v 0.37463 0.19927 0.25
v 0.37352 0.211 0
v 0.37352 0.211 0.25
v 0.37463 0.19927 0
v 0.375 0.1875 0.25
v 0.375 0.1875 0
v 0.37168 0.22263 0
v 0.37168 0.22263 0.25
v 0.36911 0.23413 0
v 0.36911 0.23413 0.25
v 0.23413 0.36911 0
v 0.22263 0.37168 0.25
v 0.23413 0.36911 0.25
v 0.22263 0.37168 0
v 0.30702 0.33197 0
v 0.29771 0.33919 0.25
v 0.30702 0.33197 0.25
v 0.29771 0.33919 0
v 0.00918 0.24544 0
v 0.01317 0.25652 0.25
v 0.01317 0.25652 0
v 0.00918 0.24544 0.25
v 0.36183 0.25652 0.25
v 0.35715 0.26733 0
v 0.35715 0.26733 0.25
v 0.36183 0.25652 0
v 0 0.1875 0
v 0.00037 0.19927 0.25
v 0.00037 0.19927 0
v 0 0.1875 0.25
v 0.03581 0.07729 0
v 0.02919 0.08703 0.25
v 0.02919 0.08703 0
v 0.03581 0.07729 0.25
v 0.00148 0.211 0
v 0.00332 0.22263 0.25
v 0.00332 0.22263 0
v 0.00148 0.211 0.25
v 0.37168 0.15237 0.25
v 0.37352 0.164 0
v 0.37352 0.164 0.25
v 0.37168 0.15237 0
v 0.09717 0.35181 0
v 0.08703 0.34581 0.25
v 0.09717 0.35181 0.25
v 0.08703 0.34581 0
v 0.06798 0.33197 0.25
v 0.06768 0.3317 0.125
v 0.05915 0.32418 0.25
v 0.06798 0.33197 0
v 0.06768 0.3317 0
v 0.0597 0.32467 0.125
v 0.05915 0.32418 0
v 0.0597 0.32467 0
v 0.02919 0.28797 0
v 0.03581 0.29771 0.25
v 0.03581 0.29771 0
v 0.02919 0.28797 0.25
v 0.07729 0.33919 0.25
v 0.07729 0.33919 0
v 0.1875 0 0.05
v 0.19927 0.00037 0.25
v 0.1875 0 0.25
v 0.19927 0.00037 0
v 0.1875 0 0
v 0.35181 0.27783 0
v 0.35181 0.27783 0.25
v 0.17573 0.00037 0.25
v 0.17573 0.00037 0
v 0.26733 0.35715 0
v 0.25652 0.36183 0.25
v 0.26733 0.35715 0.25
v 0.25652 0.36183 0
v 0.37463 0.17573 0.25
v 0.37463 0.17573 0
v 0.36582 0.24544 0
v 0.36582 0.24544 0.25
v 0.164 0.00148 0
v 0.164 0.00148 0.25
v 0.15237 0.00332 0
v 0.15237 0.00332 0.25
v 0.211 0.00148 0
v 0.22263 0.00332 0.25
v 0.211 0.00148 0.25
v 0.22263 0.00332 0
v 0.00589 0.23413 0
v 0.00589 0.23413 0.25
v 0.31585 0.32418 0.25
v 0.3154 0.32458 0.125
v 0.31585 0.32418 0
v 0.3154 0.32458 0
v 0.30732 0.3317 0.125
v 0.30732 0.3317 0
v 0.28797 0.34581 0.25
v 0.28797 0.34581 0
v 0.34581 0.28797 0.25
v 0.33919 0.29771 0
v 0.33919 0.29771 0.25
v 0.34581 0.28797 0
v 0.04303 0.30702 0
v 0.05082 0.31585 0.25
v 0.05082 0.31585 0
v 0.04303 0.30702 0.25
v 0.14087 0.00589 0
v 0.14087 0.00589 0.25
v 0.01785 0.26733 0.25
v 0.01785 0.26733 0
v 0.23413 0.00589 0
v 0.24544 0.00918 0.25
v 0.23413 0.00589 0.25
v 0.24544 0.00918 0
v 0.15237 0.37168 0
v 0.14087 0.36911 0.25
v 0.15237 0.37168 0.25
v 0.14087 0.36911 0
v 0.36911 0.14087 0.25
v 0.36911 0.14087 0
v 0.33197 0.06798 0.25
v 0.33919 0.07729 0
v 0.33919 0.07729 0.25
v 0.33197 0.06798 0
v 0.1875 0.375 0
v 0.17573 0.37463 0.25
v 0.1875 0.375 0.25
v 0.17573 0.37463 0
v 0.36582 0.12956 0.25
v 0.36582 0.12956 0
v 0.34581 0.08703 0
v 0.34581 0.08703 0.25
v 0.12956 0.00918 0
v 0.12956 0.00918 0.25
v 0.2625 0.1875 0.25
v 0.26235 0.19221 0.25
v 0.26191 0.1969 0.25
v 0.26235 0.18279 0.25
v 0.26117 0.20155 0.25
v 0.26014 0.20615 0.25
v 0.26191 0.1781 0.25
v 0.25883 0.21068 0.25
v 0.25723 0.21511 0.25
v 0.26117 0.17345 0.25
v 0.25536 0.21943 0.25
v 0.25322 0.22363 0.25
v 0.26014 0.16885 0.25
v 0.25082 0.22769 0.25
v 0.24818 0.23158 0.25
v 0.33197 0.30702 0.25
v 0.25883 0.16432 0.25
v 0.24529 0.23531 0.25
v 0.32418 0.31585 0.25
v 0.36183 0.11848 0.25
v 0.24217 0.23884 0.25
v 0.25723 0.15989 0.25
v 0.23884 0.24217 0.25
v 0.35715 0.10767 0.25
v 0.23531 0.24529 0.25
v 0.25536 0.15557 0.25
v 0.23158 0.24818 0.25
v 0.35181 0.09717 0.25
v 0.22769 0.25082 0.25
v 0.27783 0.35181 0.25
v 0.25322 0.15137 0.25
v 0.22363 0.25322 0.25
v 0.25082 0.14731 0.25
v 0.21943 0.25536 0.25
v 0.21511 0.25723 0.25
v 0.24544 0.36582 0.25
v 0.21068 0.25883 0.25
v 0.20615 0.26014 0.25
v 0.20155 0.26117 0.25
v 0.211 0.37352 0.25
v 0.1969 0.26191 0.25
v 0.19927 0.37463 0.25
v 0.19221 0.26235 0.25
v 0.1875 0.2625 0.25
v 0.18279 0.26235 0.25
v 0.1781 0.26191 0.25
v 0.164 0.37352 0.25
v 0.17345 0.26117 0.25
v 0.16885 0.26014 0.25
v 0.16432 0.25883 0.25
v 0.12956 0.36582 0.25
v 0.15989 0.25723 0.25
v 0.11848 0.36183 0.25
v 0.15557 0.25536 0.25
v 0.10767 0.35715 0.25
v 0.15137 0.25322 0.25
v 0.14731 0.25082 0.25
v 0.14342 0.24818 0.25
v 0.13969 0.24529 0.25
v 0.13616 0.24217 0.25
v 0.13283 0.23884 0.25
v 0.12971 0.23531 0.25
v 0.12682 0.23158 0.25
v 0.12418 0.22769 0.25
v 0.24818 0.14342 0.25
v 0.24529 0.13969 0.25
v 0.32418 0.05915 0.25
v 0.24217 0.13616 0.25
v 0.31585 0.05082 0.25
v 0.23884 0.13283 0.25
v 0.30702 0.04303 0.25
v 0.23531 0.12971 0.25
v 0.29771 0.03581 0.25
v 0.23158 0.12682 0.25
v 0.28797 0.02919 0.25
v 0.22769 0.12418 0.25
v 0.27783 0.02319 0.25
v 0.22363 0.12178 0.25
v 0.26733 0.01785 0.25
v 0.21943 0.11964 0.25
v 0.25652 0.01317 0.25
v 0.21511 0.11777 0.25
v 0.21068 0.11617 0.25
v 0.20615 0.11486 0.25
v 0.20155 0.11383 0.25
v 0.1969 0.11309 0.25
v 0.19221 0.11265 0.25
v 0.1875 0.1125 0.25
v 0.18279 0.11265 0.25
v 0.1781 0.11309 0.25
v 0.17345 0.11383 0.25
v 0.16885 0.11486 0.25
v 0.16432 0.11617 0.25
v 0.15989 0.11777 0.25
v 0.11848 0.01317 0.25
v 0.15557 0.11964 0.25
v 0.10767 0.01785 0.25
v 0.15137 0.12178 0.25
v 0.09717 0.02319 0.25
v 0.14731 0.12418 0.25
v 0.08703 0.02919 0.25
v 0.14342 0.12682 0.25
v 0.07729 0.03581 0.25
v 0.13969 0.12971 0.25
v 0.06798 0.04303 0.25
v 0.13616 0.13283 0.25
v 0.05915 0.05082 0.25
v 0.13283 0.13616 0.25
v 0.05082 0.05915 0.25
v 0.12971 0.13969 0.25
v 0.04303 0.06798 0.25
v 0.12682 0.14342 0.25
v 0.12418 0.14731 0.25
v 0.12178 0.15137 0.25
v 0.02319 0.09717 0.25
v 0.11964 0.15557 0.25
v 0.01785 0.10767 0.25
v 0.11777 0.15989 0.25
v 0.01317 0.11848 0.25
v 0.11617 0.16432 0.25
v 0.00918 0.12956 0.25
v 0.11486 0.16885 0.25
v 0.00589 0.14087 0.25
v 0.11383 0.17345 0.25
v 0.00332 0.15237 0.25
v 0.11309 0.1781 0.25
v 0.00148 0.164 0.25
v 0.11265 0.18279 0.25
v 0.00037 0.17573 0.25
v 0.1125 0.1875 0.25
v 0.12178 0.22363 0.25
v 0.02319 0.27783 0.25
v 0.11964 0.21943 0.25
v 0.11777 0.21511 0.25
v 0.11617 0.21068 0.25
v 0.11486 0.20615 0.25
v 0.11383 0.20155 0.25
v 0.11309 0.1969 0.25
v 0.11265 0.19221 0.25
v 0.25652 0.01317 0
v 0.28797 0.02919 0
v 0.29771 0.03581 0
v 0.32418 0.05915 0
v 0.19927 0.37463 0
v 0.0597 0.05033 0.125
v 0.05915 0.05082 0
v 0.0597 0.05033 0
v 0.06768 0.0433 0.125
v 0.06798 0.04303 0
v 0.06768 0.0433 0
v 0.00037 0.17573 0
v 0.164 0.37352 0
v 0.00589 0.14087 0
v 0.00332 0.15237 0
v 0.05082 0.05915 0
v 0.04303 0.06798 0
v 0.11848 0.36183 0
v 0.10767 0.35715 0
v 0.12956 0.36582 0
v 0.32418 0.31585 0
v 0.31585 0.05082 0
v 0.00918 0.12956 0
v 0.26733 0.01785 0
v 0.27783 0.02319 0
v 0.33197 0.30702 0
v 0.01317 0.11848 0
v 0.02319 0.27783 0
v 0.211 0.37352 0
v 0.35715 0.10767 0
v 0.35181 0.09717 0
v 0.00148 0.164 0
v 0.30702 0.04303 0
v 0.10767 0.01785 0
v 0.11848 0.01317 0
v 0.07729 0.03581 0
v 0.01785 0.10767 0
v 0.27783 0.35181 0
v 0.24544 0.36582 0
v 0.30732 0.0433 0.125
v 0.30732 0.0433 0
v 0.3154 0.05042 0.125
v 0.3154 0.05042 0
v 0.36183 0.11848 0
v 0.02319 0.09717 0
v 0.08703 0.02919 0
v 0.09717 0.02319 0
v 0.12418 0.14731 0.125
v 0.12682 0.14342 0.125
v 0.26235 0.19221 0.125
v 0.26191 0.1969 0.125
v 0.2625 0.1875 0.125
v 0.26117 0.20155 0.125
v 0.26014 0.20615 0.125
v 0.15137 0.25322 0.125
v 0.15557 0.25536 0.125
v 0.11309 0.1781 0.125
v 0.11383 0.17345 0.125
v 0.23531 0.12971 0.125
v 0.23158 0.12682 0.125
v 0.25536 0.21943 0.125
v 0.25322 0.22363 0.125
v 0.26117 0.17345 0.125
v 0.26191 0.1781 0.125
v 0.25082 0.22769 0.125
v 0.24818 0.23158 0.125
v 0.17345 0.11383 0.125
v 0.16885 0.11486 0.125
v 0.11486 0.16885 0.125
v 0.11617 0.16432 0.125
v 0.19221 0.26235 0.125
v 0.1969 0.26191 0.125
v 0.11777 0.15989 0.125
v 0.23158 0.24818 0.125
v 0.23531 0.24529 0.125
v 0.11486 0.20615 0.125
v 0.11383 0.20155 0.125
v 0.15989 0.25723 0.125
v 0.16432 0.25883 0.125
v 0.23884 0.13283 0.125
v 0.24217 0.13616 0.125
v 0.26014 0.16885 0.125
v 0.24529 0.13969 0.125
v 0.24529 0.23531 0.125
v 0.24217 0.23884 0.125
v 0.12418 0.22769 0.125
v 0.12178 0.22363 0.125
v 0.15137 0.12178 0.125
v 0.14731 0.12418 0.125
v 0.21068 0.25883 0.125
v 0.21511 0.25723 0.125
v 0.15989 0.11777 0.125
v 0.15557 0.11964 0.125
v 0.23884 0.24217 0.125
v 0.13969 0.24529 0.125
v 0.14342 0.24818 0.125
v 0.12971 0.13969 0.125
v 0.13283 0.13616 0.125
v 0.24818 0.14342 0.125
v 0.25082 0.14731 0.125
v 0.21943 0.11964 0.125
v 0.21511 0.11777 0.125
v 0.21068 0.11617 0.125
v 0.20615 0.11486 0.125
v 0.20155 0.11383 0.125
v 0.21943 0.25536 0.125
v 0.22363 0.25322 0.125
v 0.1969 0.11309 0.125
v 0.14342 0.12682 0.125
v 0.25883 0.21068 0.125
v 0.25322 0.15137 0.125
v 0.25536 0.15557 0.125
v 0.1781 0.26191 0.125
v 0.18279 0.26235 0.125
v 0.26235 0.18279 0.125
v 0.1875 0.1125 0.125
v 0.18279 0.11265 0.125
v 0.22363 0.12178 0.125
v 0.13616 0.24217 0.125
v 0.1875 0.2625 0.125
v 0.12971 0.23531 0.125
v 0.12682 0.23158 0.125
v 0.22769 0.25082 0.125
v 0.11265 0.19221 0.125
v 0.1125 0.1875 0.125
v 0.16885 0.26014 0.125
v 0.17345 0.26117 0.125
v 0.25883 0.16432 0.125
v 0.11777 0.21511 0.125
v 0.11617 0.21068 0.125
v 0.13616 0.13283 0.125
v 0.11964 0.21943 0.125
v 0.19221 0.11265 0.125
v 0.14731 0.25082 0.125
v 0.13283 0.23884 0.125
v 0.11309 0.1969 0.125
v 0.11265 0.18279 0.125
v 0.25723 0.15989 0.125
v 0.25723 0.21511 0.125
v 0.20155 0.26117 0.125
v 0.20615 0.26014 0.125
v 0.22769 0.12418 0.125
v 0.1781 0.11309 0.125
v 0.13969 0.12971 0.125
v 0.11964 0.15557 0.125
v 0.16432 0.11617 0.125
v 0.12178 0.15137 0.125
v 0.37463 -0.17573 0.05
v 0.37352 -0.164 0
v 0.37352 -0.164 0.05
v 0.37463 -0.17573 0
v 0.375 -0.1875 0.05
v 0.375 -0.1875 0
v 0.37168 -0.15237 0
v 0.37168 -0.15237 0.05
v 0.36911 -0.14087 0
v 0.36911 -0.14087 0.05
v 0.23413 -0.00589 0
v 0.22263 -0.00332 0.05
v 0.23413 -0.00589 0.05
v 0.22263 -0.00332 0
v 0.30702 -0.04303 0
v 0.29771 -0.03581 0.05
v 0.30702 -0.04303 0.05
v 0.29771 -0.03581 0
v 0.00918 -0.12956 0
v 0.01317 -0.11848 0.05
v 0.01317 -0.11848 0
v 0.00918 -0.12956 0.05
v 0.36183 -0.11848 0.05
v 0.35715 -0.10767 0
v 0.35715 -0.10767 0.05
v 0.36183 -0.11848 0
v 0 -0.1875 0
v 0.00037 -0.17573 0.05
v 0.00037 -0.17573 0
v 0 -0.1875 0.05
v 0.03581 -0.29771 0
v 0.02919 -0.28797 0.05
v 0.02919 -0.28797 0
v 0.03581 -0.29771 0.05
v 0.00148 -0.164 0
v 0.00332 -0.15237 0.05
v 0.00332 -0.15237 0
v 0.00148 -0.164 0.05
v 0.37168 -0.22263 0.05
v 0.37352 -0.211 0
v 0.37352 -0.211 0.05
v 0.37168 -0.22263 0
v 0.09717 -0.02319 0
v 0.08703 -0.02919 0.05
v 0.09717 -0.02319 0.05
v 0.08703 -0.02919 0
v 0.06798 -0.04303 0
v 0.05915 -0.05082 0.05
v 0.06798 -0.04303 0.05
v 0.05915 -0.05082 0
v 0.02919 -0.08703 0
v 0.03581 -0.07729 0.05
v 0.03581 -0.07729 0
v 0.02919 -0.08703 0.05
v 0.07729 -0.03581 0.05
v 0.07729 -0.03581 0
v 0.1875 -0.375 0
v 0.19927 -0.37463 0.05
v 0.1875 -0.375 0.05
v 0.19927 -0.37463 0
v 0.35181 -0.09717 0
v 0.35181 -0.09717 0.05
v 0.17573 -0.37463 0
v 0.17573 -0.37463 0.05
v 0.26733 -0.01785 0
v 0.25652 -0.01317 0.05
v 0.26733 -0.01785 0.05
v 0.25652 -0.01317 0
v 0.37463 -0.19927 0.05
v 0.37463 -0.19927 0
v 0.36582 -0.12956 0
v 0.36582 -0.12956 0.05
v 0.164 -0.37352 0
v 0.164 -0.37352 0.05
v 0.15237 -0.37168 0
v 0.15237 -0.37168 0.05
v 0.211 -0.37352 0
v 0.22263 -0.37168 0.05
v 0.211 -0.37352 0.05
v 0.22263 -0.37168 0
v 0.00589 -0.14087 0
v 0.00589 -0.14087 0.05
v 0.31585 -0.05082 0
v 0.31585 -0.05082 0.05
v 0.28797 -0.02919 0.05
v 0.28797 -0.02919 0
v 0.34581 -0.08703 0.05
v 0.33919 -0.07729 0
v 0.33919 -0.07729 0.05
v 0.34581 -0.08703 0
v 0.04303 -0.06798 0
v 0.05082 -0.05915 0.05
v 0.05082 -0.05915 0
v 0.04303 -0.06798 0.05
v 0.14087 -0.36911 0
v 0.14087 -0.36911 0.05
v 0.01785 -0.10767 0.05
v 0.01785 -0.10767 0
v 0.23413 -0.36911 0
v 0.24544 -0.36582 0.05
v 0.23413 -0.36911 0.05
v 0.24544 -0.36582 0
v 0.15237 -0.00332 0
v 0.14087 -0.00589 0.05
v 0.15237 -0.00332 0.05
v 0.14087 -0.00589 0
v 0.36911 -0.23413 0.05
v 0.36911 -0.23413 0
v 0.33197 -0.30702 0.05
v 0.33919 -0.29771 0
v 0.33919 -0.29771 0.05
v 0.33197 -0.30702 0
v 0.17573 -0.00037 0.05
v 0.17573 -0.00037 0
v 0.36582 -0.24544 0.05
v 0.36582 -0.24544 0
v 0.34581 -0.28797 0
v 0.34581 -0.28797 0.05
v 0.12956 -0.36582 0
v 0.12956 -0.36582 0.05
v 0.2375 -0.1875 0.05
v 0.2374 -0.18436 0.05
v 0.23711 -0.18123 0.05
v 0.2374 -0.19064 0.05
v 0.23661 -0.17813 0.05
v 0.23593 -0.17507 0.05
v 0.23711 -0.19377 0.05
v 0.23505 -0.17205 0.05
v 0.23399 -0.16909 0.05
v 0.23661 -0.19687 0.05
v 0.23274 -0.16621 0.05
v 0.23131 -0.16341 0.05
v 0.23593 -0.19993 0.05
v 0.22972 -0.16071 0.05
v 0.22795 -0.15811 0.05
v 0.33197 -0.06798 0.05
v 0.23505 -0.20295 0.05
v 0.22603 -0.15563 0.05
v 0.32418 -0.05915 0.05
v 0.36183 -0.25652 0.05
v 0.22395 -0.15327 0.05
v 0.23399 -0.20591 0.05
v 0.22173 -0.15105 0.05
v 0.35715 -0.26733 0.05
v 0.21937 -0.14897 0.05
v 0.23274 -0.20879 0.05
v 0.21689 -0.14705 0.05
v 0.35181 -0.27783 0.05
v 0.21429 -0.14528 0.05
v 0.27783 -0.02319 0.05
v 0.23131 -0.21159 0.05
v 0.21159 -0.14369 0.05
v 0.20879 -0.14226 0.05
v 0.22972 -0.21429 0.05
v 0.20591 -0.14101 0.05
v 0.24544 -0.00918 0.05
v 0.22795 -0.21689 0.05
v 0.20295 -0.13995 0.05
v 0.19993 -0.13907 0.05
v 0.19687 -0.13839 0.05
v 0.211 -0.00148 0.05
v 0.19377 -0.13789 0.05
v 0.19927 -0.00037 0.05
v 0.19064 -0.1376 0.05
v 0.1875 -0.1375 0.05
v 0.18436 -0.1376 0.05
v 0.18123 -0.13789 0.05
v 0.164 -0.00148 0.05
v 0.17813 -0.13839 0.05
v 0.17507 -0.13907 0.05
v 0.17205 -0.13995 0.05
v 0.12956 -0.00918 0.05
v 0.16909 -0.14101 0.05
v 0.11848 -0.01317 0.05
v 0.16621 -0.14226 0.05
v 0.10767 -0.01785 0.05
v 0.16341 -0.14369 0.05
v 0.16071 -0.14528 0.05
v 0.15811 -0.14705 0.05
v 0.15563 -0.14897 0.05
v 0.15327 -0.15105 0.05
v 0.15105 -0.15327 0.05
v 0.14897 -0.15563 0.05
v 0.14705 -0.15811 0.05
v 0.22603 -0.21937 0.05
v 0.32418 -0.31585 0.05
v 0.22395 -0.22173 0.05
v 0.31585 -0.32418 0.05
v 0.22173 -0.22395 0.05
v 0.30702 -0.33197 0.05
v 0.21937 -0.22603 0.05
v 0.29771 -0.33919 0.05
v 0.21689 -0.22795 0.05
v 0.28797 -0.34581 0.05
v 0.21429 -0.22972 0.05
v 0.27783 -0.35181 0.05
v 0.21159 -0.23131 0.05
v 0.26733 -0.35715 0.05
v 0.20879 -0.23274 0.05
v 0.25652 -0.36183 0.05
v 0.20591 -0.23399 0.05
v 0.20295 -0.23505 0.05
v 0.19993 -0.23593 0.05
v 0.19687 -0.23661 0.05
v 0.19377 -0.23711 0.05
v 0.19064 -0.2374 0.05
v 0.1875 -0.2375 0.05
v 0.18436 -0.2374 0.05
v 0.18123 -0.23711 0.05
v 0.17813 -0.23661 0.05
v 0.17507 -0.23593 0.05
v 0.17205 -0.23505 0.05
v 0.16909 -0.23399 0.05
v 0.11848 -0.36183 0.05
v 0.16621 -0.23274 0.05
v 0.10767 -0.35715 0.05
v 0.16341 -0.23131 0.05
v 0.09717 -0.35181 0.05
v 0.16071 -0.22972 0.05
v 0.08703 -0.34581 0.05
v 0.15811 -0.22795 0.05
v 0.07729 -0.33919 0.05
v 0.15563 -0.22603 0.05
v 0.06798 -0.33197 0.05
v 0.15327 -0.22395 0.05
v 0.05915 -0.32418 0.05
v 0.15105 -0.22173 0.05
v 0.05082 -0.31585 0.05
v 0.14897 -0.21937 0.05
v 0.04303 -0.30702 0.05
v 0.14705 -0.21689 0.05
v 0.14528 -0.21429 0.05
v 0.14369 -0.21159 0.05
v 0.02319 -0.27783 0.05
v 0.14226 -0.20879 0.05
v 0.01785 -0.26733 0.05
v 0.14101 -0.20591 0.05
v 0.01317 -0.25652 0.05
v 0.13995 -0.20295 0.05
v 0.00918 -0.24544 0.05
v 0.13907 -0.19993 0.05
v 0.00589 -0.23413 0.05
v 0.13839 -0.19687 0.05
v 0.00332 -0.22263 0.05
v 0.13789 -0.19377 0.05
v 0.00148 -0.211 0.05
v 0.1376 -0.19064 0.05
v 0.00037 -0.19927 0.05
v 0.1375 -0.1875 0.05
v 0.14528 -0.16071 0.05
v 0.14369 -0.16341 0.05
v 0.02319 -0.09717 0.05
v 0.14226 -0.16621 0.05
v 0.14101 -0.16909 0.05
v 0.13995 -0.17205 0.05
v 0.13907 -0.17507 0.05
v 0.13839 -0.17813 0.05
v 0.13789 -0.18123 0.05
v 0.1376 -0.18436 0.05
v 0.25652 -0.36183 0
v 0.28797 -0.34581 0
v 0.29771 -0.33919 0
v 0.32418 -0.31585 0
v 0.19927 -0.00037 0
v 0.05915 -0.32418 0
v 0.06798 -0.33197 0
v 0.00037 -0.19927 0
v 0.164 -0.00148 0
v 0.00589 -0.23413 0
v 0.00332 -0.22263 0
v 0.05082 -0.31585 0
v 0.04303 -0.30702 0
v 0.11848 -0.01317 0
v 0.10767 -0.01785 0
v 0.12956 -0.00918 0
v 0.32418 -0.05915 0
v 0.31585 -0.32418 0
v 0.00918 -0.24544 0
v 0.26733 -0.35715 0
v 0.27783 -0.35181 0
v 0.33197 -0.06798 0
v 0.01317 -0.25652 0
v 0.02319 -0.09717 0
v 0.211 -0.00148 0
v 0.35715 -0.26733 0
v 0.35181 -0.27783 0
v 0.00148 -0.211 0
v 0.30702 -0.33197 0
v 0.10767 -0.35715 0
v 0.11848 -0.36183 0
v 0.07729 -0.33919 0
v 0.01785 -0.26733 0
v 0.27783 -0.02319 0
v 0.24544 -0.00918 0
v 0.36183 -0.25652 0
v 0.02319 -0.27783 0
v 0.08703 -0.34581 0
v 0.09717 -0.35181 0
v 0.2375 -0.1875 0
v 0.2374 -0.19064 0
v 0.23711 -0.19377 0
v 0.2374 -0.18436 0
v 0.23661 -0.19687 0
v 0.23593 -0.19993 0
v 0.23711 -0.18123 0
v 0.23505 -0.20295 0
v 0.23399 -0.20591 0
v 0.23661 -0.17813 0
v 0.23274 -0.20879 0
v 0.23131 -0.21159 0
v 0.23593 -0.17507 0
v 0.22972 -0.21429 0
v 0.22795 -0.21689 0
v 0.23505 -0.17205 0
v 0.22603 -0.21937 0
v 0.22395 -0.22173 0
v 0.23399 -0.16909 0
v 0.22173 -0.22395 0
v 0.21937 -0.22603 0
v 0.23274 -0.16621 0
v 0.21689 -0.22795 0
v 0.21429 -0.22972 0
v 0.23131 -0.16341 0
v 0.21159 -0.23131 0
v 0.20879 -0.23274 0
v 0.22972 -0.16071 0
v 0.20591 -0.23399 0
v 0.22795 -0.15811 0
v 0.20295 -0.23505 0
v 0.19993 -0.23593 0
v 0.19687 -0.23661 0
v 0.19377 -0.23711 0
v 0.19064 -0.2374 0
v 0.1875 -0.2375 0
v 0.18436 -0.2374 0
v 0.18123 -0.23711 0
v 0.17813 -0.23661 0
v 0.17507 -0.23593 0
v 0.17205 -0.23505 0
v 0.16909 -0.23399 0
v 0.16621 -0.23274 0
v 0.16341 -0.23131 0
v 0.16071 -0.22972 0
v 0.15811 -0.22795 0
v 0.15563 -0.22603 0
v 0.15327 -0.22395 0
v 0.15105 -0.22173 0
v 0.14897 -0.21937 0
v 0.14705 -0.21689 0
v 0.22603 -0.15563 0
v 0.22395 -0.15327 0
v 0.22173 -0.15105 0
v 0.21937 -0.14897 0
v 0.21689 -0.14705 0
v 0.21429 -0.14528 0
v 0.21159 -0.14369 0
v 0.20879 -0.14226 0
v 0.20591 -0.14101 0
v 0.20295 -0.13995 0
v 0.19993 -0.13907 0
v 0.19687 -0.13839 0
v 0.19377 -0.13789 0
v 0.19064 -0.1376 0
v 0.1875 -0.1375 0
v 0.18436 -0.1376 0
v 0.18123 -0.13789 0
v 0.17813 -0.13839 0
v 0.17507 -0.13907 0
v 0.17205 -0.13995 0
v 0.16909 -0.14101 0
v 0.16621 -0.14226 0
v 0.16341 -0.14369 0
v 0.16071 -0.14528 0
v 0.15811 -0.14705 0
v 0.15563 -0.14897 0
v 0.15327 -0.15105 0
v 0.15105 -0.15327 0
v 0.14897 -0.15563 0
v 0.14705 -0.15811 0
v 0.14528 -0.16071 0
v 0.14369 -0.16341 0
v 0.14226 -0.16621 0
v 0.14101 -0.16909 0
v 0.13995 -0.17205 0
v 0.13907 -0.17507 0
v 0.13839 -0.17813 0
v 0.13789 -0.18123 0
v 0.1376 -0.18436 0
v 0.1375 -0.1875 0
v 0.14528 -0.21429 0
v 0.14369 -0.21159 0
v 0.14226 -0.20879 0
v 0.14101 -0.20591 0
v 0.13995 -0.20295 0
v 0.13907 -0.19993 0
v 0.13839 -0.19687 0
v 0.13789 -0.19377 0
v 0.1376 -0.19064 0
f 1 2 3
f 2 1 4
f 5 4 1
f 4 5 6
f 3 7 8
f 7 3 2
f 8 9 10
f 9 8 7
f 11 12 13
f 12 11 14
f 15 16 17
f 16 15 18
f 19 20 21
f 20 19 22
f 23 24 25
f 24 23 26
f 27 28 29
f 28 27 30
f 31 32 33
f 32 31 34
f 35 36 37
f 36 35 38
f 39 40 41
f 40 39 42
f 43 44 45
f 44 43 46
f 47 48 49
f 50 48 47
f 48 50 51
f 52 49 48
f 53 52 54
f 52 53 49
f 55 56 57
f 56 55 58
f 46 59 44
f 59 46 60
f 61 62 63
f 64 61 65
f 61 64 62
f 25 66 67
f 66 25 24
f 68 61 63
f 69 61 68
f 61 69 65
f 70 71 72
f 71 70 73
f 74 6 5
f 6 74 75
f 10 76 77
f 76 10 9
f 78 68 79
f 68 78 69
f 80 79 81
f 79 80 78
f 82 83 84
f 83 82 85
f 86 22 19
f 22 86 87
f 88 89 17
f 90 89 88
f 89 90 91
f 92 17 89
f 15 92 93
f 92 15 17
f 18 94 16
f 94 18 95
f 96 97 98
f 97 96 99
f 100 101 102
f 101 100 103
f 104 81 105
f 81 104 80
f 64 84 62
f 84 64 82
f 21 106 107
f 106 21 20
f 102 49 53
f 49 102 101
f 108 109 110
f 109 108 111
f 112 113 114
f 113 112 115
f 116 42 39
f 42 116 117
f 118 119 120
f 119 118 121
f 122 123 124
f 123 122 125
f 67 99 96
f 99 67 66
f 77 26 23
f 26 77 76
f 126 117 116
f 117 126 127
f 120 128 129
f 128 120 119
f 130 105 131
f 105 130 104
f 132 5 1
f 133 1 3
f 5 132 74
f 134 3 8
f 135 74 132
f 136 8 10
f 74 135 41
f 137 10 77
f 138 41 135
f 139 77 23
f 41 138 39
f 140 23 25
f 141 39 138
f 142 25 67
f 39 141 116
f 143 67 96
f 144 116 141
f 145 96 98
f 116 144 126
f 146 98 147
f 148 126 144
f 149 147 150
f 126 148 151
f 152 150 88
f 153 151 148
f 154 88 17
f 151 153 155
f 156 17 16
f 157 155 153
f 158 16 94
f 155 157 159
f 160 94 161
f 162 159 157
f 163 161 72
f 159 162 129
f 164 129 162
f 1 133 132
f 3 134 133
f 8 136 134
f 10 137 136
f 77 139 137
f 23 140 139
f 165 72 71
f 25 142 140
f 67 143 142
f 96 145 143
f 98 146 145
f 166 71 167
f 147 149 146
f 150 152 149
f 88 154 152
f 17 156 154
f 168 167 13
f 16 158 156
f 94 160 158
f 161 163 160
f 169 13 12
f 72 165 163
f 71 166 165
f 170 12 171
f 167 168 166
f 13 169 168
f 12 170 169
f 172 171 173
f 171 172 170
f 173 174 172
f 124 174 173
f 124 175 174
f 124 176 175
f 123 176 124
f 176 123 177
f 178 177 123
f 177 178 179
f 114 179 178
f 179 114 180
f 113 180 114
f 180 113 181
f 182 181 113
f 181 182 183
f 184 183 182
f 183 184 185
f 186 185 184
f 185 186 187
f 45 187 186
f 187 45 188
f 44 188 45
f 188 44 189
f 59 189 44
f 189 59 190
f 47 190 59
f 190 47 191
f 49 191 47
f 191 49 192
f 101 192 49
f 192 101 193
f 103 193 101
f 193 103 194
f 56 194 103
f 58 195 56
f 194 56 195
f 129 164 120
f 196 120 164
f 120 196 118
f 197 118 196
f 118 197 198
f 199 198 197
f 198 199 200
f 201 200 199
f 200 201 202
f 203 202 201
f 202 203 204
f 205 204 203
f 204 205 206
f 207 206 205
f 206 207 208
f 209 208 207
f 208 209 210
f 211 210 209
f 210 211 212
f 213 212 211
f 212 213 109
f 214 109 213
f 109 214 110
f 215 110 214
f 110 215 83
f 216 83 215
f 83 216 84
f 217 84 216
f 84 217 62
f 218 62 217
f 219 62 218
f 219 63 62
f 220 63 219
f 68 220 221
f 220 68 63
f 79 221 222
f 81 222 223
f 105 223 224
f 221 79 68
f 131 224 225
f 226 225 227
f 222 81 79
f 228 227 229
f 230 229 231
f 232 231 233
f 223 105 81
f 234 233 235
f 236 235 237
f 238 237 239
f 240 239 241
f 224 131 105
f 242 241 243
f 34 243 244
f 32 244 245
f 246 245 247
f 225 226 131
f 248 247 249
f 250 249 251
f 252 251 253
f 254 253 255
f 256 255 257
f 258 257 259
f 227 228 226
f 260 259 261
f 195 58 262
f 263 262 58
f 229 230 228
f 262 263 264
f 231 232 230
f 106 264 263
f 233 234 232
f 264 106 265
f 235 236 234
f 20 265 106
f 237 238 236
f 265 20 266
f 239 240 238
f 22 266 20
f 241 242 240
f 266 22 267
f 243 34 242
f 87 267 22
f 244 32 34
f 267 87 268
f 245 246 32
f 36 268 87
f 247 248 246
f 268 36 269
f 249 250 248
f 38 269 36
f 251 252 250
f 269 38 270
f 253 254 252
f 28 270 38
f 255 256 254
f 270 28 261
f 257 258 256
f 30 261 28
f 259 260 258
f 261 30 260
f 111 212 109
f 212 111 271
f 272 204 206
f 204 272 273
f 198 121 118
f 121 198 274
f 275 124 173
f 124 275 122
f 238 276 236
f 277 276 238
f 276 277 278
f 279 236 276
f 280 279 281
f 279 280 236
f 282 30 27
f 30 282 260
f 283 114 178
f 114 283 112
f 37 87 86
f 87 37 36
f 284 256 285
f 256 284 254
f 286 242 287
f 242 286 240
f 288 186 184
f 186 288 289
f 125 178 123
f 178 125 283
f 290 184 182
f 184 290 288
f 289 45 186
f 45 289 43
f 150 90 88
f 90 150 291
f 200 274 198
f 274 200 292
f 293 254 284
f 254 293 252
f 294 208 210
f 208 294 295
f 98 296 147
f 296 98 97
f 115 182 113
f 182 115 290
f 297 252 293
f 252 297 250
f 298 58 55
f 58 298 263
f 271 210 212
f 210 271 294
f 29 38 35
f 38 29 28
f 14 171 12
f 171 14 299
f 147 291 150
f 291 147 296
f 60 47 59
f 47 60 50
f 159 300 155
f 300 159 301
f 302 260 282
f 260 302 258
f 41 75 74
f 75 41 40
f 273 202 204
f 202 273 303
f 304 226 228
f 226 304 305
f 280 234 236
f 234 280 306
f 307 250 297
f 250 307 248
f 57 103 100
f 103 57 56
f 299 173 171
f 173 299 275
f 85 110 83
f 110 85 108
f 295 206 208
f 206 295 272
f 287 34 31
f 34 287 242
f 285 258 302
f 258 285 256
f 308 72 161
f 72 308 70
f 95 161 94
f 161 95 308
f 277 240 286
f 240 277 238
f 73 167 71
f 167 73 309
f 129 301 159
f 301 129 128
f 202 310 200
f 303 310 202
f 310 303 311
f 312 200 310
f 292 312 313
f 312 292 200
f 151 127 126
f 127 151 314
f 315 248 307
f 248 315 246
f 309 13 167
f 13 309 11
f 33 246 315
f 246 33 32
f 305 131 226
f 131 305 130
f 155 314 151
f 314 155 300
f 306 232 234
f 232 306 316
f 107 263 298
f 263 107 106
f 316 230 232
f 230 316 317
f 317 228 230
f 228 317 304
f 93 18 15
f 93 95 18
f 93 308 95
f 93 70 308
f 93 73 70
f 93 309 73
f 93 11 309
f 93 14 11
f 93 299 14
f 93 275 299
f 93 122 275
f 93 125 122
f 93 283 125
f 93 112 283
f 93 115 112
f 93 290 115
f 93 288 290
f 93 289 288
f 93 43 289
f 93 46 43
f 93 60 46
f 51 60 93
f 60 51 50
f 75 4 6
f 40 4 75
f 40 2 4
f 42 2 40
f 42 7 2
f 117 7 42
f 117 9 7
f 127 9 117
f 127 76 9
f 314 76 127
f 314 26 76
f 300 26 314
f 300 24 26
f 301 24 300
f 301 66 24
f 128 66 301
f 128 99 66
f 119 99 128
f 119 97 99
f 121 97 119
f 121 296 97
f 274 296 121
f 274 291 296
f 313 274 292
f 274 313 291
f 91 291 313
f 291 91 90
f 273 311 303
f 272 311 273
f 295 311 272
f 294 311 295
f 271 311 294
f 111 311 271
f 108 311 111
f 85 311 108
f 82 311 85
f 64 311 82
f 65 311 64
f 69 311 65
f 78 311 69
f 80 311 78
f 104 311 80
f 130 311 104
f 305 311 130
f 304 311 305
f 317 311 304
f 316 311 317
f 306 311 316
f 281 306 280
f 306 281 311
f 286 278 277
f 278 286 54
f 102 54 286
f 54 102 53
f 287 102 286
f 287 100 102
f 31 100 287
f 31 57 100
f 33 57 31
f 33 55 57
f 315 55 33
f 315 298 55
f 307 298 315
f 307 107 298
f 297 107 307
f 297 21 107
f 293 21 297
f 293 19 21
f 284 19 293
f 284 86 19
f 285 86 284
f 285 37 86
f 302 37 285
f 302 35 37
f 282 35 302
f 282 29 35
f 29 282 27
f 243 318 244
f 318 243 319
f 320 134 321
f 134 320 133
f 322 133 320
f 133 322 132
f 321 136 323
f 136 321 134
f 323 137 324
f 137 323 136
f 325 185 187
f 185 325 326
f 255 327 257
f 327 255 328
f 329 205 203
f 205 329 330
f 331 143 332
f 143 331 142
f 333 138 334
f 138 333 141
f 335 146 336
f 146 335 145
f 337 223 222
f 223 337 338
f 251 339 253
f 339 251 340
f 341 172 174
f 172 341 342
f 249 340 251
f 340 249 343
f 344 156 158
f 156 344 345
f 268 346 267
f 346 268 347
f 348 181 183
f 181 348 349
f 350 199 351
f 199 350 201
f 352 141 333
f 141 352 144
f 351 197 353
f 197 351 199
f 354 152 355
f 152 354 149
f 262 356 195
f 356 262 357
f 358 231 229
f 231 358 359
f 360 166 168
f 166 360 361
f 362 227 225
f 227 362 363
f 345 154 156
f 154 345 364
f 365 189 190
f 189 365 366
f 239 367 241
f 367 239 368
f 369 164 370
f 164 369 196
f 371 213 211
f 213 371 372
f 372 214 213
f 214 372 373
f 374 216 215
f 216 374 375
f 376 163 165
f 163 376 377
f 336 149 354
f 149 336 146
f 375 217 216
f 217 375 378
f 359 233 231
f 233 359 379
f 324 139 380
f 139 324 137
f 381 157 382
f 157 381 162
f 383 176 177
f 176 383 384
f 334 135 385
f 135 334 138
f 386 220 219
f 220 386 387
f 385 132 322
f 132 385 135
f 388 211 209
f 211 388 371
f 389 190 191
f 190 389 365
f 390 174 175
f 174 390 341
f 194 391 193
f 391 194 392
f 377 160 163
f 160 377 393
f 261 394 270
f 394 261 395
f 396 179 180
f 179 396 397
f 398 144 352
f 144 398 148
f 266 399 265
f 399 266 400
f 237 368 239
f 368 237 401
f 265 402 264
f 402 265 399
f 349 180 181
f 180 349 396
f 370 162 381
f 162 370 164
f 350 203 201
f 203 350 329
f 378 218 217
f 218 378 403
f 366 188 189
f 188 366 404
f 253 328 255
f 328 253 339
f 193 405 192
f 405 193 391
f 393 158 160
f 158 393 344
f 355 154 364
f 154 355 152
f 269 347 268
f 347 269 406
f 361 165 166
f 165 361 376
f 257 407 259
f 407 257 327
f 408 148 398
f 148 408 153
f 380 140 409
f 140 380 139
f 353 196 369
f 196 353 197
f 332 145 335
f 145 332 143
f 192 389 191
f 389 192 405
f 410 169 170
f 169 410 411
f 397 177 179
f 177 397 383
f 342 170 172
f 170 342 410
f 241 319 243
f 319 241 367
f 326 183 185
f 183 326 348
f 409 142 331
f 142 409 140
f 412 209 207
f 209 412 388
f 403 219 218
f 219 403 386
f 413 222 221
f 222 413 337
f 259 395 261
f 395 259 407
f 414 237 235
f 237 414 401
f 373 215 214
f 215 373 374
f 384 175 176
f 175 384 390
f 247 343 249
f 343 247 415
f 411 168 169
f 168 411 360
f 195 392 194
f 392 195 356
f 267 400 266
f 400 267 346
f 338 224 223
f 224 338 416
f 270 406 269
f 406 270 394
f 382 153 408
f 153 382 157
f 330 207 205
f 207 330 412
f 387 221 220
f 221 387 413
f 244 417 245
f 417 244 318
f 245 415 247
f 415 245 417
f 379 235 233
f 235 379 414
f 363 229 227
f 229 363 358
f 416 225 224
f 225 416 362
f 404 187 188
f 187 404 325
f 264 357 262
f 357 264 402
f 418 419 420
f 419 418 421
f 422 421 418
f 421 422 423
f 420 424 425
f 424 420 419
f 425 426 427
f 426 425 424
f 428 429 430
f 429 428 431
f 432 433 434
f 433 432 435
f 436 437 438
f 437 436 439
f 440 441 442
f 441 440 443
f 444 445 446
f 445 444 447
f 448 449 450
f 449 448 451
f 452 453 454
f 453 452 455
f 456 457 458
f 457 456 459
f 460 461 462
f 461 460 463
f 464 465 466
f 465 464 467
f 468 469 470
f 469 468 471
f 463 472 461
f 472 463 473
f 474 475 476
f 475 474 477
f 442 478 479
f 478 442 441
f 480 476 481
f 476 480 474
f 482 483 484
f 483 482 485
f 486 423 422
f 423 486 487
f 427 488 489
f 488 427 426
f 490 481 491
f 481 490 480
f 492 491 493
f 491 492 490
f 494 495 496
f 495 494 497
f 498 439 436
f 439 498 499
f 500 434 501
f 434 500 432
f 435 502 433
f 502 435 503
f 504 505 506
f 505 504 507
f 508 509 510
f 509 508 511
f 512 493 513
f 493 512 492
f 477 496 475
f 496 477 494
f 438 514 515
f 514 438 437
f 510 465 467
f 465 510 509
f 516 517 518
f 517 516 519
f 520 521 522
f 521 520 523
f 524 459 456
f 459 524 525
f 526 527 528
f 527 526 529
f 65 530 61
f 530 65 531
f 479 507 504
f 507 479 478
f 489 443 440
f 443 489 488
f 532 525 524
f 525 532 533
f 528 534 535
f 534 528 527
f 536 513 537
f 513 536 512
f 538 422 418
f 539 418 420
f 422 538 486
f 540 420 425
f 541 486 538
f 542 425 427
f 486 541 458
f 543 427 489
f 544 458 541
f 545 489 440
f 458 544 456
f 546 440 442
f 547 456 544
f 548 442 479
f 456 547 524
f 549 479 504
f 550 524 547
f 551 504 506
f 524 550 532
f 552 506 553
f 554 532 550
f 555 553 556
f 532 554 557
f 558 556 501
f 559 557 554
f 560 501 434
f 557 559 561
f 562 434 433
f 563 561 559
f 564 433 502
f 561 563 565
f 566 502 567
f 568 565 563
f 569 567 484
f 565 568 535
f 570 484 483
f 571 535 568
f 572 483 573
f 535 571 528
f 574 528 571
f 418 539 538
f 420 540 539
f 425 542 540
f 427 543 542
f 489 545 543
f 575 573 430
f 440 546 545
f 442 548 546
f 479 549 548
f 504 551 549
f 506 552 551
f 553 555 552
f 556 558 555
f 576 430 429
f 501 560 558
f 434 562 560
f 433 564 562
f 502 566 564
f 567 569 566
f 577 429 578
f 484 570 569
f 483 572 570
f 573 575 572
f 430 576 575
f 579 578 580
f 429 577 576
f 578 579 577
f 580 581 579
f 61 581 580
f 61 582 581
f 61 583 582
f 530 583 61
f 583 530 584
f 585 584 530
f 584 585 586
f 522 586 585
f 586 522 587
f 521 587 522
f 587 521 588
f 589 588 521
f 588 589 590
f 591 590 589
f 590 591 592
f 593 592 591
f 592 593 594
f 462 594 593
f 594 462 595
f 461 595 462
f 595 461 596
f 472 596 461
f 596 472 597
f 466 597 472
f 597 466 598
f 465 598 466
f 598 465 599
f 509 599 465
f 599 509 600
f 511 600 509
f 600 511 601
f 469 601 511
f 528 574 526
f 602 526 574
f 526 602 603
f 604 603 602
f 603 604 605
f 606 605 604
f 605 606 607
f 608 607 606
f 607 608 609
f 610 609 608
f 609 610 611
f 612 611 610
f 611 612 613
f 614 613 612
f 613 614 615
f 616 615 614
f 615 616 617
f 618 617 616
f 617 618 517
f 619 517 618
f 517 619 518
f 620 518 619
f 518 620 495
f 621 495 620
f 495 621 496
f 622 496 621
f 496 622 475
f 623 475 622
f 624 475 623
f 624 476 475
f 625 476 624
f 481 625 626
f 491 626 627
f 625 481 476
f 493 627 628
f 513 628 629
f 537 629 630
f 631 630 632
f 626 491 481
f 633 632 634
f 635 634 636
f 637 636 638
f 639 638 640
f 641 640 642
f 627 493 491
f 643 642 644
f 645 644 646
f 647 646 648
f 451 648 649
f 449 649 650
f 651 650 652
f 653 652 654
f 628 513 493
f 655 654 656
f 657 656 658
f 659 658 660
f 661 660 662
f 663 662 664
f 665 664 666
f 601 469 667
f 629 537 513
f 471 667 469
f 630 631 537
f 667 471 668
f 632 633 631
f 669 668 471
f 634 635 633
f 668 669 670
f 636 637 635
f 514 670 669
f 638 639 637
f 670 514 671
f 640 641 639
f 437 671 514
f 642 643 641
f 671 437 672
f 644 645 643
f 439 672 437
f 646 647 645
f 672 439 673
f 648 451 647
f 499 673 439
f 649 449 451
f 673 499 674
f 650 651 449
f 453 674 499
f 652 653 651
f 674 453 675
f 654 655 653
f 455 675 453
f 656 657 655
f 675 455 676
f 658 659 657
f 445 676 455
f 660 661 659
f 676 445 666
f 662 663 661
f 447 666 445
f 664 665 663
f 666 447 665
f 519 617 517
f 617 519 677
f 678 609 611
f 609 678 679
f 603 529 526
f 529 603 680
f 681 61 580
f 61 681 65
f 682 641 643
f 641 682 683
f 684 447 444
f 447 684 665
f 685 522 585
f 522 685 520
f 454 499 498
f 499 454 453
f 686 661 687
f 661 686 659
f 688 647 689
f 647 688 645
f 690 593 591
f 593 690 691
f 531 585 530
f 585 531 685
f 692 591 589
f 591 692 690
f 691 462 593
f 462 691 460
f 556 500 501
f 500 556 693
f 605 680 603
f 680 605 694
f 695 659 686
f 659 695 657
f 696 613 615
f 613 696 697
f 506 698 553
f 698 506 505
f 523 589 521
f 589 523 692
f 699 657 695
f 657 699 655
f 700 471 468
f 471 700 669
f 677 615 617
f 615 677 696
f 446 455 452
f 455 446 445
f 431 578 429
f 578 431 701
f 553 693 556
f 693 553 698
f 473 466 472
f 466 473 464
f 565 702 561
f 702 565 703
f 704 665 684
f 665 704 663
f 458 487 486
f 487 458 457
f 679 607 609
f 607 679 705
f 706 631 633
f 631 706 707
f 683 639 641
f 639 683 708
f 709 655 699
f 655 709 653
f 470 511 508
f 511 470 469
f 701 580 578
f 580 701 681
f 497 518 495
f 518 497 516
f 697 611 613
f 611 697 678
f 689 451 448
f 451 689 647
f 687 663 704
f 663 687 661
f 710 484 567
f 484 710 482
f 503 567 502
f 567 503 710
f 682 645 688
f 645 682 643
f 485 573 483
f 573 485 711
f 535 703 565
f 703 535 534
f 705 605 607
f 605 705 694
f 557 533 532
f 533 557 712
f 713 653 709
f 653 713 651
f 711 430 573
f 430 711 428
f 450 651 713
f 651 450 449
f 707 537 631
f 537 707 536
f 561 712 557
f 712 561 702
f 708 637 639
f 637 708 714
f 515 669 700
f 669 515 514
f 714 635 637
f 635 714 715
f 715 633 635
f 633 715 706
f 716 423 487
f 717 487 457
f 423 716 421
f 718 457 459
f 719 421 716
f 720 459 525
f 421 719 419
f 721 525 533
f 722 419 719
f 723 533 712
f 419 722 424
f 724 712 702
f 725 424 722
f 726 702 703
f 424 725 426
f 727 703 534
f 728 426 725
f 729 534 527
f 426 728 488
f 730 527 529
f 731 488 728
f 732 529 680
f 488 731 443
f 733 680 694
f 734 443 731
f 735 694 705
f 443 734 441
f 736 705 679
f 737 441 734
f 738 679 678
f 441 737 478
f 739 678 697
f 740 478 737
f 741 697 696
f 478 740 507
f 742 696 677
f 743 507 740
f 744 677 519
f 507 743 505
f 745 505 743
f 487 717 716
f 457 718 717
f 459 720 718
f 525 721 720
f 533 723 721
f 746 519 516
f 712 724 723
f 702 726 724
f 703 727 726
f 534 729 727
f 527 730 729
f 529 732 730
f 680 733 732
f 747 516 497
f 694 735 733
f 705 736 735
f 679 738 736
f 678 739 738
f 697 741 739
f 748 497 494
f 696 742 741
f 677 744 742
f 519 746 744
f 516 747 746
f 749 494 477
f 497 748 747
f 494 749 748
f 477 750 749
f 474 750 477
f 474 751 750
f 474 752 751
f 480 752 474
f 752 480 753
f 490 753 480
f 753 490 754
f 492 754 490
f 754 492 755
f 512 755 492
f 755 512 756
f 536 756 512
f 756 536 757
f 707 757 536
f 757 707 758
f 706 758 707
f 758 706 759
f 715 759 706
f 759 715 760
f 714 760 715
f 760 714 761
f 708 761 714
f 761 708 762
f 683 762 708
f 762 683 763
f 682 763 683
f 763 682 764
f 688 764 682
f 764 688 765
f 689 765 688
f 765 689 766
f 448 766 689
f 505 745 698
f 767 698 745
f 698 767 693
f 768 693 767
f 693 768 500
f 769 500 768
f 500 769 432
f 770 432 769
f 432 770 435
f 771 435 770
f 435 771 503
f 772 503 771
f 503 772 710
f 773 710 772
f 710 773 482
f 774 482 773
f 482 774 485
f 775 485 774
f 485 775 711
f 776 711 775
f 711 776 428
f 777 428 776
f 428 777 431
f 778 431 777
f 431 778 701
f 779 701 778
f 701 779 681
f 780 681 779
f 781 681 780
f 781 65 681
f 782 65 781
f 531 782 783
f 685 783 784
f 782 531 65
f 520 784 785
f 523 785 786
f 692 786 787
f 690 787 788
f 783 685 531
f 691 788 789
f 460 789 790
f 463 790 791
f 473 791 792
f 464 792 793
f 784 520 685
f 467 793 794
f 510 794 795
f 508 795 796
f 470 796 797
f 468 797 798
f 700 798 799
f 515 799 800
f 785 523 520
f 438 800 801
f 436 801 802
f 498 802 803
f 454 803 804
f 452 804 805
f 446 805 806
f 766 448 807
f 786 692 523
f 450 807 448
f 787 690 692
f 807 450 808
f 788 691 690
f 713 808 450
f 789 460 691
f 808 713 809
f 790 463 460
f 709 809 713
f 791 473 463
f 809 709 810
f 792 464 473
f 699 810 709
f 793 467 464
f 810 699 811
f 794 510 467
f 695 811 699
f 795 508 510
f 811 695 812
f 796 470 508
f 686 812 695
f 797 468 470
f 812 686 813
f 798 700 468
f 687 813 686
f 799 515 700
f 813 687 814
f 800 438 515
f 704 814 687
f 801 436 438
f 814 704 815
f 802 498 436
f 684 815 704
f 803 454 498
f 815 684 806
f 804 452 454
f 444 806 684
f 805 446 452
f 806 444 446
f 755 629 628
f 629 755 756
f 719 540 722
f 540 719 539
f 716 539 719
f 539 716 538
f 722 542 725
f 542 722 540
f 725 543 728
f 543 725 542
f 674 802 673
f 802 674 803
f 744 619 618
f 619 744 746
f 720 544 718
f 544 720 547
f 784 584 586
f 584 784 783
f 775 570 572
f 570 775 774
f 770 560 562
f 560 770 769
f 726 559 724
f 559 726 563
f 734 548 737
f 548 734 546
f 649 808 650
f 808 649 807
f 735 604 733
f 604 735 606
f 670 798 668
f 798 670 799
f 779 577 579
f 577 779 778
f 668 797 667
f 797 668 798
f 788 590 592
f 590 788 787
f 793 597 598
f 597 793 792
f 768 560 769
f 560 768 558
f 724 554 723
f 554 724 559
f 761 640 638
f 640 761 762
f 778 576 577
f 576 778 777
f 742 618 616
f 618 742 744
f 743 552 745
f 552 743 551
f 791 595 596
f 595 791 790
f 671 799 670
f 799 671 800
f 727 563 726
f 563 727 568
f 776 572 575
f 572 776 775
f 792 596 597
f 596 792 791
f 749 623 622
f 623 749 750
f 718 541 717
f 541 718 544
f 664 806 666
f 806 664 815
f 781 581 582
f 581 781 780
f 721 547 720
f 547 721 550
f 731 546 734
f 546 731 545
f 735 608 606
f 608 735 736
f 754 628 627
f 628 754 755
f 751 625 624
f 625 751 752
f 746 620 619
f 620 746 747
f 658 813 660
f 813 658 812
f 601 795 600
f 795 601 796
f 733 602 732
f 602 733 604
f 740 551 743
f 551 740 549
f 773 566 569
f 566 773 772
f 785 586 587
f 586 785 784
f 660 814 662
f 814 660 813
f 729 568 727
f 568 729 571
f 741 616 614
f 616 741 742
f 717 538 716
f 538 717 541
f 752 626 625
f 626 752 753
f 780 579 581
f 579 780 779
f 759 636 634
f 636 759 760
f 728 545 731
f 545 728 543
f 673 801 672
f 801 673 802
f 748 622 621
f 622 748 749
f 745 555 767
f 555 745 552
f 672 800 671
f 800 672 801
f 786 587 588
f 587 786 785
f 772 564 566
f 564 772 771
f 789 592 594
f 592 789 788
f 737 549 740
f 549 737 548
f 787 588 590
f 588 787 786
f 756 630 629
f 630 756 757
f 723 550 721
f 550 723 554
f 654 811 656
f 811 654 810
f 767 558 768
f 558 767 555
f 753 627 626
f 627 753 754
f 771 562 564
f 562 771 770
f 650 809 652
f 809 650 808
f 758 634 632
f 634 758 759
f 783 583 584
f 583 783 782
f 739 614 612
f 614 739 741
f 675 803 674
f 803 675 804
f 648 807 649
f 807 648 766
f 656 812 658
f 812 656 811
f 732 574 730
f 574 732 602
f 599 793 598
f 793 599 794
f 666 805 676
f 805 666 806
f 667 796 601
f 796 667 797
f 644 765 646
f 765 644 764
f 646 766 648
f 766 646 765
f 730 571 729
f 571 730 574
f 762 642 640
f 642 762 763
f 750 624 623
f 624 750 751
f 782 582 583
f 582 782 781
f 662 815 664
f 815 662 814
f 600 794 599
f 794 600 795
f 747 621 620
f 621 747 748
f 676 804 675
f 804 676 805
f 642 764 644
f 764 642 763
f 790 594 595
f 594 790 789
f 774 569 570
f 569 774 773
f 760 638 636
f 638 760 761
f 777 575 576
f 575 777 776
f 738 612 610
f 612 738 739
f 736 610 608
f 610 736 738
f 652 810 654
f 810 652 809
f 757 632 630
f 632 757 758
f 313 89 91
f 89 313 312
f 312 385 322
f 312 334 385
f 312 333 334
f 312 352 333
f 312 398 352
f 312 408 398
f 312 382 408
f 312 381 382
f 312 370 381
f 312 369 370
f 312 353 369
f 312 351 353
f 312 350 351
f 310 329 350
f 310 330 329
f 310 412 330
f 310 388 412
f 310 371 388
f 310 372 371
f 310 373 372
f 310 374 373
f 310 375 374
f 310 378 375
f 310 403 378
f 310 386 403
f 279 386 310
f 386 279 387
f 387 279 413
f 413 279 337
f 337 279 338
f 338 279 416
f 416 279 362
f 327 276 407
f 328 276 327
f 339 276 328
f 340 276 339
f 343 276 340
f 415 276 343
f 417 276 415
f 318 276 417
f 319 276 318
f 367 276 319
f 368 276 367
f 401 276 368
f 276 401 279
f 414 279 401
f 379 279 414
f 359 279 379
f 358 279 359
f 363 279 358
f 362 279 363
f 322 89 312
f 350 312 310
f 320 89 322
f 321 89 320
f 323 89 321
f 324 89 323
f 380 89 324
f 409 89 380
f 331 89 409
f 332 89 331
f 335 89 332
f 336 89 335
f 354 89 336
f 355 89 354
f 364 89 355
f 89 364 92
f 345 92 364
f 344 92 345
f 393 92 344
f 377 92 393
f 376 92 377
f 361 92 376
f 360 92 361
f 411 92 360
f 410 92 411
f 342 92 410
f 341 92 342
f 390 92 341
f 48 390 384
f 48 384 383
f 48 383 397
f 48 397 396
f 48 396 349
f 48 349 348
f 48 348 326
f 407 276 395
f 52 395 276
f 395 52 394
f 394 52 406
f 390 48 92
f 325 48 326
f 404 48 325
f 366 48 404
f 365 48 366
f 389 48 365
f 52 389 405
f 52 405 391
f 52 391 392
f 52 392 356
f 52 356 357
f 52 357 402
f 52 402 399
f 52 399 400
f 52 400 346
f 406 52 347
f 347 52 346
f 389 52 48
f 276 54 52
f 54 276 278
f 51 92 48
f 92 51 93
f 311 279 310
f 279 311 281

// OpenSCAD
// =============================================
// Parameters
// =============================================

// Main reference dimensions
main_length = 0.375;      // Overall X span
main_width  = 0.375;      // Overall Y span
main_height = 0.25;       // Main sleeve height (Z)

// Main annular cylinder (sleeve)
main_cx = 0.1875;         // Center X from left edge
main_cy = 0.1875;         // Center Y from front edge
main_R  = 0.1875;         // Outer radius
main_r  = 0.075;          // Through-bore radius (on main axis)
// Radial wall thickness: 0.1875 - 0.075 = 0.1125

// Shallow annular tab
tab_cx = 0.1875;          // Center X from left edge
tab_cy = -0.1875;         // Center Y (extends forward of reference)
tab_R  = 0.1875;          // Outer radius
tab_r  = 0.05;            // Through-opening radius
tab_h  = 0.05;            // Height from base datum
// Radial wall thickness: 0.1875 - 0.05 = 0.1375

// Underside recess (rectangular pocket from base)
// Bounded footprint: 0.2557 x 0.2884
recess_off_l = 0.0597;    // Left edge offset from reference
recess_off_r = 0.0596;    // Right edge offset from reference
recess_off_f = 0.0433;    // Front edge offset from reference
recess_off_b = 0.0433;    // Back edge offset from reference
recess_w = main_length - recess_off_l - recess_off_r;  // 0.2557
recess_d = main_width  - recess_off_f - recess_off_b;   // 0.2884
recess_h = 0.125;         // Recess depth (z=0 to z=0.125)

// Resolution
$fn  = 100;
eps  = 0.001;

// =============================================
// Main Model
// =============================================

difference() {
    union() {
        // Main annular cylinder (sleeve)
        translate([main_cx, main_cy, 0])
            difference() {
                cylinder(h = main_height, r = main_R);
                translate([0, 0, -eps])
                    cylinder(h = main_height + 2 * eps, r = main_r);
            }

        // Shallow annular tab (attached forward of sleeve)
        translate([tab_cx, tab_cy, 0])
            difference() {
                cylinder(h = tab_h, r = tab_R);
                translate([0, 0, -eps])
                    cylinder(h = tab_h + 2 * eps, r = tab_r);
            }
    }

    // Underside rectangular recess (counterbore pocket from base)
    translate([recess_off_l, recess_off_f, -eps])
        cube([recess_w, recess_d, recess_h + eps]);
}
